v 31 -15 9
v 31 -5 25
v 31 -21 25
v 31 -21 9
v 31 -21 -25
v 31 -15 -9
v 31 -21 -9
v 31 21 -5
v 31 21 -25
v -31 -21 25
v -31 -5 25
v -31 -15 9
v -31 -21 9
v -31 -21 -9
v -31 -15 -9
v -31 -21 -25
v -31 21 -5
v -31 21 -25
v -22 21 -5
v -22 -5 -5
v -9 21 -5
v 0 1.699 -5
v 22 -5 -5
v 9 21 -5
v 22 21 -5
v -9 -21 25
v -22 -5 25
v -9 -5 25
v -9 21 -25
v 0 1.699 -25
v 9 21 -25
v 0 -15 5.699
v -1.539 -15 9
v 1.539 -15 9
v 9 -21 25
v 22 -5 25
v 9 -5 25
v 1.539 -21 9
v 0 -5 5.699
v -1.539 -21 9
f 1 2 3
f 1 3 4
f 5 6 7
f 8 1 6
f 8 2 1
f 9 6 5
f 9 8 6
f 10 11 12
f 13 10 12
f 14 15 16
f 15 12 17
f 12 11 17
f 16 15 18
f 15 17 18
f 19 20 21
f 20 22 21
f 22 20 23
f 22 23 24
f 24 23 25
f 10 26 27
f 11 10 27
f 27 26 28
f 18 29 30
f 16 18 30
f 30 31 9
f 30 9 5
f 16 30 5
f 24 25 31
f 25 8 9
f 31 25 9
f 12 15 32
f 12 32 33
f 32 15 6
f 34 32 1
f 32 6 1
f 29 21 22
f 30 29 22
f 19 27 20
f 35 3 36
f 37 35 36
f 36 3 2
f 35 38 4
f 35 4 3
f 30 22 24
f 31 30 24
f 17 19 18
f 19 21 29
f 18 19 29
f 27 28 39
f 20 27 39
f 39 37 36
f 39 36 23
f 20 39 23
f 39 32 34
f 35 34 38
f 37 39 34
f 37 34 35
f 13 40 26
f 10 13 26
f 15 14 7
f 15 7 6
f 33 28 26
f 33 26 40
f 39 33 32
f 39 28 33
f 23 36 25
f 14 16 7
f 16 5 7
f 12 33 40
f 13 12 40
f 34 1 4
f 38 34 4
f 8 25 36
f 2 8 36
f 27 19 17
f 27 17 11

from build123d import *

# Parameters (mm, degrees)
BOSS_EXTRUDE2_DEPTH = 31
BOSS_EXTRUDE3_START = 22
BOSS_EXTRUDE3_DEPTH = 9
BOSS_EXTRUDE4_START = -22
BOSS_EXTRUDE4_DEPTH = 9
CUT_EXTRUDE3_DEPTH  = 46.022216738
CUT_EXTRUDE4_DEPTH  = 46.022216738


with BuildPart() as part:
    # Sketch2 → Boss-Extrude2 (new, symmetric)
    with BuildSketch(Plane(origin=(0, 0, 0), x_dir=(0, 0, -1), z_dir=(1, 0, 0))):
        Polygon((5, 21), (25, 21), (25, -21), (9, -21), (9, -15), (-9, -15), (-9, -21), (-25, -21), (-25, -5), (5, -5), align=None)
    extrude(amount=BOSS_EXTRUDE2_DEPTH, both=True)

    # Sketch3 → Boss-Extrude3 (add)
    with BuildSketch(Plane(origin=(0, 0, 0), x_dir=(0, 0, -1), z_dir=(1, 0, 0)).offset(BOSS_EXTRUDE3_START)):
        Polygon((5, 21), (-25, -5), (5, -5), align=None)
    extrude(amount=BOSS_EXTRUDE3_DEPTH)

    # Sketch3<4> → Boss-Extrude4 (add)
    with BuildSketch(Plane(origin=(0, 0, 0), x_dir=(0, 0, -1), z_dir=(1, 0, 0)).offset(BOSS_EXTRUDE4_START)):
        Polygon((5, 21), (-25, -5), (5, -5), align=None)
    extrude(amount=-BOSS_EXTRUDE4_DEPTH)

    # Sketch4 → Cut-Extrude3 (cut, through all)
    with BuildSketch(Plane(origin=(0, 0, 0), x_dir=(1, 0, 0), z_dir=(0, 1, 0))):
        Polygon((-9, -25), (0, -5.699437715), (9, -25), align=None)
    extrude(amount=-CUT_EXTRUDE3_DEPTH, mode=Mode.SUBTRACT)

    # Sketch6 → Cut-Extrude4 (cut, through all)
    with BuildSketch(Plane.XY):
        Polygon((-9, 21), (0, 1.699437715), (9, 21), align=None)
    extrude(amount=-CUT_EXTRUDE4_DEPTH, mode=Mode.SUBTRACT)


solid = part.part
